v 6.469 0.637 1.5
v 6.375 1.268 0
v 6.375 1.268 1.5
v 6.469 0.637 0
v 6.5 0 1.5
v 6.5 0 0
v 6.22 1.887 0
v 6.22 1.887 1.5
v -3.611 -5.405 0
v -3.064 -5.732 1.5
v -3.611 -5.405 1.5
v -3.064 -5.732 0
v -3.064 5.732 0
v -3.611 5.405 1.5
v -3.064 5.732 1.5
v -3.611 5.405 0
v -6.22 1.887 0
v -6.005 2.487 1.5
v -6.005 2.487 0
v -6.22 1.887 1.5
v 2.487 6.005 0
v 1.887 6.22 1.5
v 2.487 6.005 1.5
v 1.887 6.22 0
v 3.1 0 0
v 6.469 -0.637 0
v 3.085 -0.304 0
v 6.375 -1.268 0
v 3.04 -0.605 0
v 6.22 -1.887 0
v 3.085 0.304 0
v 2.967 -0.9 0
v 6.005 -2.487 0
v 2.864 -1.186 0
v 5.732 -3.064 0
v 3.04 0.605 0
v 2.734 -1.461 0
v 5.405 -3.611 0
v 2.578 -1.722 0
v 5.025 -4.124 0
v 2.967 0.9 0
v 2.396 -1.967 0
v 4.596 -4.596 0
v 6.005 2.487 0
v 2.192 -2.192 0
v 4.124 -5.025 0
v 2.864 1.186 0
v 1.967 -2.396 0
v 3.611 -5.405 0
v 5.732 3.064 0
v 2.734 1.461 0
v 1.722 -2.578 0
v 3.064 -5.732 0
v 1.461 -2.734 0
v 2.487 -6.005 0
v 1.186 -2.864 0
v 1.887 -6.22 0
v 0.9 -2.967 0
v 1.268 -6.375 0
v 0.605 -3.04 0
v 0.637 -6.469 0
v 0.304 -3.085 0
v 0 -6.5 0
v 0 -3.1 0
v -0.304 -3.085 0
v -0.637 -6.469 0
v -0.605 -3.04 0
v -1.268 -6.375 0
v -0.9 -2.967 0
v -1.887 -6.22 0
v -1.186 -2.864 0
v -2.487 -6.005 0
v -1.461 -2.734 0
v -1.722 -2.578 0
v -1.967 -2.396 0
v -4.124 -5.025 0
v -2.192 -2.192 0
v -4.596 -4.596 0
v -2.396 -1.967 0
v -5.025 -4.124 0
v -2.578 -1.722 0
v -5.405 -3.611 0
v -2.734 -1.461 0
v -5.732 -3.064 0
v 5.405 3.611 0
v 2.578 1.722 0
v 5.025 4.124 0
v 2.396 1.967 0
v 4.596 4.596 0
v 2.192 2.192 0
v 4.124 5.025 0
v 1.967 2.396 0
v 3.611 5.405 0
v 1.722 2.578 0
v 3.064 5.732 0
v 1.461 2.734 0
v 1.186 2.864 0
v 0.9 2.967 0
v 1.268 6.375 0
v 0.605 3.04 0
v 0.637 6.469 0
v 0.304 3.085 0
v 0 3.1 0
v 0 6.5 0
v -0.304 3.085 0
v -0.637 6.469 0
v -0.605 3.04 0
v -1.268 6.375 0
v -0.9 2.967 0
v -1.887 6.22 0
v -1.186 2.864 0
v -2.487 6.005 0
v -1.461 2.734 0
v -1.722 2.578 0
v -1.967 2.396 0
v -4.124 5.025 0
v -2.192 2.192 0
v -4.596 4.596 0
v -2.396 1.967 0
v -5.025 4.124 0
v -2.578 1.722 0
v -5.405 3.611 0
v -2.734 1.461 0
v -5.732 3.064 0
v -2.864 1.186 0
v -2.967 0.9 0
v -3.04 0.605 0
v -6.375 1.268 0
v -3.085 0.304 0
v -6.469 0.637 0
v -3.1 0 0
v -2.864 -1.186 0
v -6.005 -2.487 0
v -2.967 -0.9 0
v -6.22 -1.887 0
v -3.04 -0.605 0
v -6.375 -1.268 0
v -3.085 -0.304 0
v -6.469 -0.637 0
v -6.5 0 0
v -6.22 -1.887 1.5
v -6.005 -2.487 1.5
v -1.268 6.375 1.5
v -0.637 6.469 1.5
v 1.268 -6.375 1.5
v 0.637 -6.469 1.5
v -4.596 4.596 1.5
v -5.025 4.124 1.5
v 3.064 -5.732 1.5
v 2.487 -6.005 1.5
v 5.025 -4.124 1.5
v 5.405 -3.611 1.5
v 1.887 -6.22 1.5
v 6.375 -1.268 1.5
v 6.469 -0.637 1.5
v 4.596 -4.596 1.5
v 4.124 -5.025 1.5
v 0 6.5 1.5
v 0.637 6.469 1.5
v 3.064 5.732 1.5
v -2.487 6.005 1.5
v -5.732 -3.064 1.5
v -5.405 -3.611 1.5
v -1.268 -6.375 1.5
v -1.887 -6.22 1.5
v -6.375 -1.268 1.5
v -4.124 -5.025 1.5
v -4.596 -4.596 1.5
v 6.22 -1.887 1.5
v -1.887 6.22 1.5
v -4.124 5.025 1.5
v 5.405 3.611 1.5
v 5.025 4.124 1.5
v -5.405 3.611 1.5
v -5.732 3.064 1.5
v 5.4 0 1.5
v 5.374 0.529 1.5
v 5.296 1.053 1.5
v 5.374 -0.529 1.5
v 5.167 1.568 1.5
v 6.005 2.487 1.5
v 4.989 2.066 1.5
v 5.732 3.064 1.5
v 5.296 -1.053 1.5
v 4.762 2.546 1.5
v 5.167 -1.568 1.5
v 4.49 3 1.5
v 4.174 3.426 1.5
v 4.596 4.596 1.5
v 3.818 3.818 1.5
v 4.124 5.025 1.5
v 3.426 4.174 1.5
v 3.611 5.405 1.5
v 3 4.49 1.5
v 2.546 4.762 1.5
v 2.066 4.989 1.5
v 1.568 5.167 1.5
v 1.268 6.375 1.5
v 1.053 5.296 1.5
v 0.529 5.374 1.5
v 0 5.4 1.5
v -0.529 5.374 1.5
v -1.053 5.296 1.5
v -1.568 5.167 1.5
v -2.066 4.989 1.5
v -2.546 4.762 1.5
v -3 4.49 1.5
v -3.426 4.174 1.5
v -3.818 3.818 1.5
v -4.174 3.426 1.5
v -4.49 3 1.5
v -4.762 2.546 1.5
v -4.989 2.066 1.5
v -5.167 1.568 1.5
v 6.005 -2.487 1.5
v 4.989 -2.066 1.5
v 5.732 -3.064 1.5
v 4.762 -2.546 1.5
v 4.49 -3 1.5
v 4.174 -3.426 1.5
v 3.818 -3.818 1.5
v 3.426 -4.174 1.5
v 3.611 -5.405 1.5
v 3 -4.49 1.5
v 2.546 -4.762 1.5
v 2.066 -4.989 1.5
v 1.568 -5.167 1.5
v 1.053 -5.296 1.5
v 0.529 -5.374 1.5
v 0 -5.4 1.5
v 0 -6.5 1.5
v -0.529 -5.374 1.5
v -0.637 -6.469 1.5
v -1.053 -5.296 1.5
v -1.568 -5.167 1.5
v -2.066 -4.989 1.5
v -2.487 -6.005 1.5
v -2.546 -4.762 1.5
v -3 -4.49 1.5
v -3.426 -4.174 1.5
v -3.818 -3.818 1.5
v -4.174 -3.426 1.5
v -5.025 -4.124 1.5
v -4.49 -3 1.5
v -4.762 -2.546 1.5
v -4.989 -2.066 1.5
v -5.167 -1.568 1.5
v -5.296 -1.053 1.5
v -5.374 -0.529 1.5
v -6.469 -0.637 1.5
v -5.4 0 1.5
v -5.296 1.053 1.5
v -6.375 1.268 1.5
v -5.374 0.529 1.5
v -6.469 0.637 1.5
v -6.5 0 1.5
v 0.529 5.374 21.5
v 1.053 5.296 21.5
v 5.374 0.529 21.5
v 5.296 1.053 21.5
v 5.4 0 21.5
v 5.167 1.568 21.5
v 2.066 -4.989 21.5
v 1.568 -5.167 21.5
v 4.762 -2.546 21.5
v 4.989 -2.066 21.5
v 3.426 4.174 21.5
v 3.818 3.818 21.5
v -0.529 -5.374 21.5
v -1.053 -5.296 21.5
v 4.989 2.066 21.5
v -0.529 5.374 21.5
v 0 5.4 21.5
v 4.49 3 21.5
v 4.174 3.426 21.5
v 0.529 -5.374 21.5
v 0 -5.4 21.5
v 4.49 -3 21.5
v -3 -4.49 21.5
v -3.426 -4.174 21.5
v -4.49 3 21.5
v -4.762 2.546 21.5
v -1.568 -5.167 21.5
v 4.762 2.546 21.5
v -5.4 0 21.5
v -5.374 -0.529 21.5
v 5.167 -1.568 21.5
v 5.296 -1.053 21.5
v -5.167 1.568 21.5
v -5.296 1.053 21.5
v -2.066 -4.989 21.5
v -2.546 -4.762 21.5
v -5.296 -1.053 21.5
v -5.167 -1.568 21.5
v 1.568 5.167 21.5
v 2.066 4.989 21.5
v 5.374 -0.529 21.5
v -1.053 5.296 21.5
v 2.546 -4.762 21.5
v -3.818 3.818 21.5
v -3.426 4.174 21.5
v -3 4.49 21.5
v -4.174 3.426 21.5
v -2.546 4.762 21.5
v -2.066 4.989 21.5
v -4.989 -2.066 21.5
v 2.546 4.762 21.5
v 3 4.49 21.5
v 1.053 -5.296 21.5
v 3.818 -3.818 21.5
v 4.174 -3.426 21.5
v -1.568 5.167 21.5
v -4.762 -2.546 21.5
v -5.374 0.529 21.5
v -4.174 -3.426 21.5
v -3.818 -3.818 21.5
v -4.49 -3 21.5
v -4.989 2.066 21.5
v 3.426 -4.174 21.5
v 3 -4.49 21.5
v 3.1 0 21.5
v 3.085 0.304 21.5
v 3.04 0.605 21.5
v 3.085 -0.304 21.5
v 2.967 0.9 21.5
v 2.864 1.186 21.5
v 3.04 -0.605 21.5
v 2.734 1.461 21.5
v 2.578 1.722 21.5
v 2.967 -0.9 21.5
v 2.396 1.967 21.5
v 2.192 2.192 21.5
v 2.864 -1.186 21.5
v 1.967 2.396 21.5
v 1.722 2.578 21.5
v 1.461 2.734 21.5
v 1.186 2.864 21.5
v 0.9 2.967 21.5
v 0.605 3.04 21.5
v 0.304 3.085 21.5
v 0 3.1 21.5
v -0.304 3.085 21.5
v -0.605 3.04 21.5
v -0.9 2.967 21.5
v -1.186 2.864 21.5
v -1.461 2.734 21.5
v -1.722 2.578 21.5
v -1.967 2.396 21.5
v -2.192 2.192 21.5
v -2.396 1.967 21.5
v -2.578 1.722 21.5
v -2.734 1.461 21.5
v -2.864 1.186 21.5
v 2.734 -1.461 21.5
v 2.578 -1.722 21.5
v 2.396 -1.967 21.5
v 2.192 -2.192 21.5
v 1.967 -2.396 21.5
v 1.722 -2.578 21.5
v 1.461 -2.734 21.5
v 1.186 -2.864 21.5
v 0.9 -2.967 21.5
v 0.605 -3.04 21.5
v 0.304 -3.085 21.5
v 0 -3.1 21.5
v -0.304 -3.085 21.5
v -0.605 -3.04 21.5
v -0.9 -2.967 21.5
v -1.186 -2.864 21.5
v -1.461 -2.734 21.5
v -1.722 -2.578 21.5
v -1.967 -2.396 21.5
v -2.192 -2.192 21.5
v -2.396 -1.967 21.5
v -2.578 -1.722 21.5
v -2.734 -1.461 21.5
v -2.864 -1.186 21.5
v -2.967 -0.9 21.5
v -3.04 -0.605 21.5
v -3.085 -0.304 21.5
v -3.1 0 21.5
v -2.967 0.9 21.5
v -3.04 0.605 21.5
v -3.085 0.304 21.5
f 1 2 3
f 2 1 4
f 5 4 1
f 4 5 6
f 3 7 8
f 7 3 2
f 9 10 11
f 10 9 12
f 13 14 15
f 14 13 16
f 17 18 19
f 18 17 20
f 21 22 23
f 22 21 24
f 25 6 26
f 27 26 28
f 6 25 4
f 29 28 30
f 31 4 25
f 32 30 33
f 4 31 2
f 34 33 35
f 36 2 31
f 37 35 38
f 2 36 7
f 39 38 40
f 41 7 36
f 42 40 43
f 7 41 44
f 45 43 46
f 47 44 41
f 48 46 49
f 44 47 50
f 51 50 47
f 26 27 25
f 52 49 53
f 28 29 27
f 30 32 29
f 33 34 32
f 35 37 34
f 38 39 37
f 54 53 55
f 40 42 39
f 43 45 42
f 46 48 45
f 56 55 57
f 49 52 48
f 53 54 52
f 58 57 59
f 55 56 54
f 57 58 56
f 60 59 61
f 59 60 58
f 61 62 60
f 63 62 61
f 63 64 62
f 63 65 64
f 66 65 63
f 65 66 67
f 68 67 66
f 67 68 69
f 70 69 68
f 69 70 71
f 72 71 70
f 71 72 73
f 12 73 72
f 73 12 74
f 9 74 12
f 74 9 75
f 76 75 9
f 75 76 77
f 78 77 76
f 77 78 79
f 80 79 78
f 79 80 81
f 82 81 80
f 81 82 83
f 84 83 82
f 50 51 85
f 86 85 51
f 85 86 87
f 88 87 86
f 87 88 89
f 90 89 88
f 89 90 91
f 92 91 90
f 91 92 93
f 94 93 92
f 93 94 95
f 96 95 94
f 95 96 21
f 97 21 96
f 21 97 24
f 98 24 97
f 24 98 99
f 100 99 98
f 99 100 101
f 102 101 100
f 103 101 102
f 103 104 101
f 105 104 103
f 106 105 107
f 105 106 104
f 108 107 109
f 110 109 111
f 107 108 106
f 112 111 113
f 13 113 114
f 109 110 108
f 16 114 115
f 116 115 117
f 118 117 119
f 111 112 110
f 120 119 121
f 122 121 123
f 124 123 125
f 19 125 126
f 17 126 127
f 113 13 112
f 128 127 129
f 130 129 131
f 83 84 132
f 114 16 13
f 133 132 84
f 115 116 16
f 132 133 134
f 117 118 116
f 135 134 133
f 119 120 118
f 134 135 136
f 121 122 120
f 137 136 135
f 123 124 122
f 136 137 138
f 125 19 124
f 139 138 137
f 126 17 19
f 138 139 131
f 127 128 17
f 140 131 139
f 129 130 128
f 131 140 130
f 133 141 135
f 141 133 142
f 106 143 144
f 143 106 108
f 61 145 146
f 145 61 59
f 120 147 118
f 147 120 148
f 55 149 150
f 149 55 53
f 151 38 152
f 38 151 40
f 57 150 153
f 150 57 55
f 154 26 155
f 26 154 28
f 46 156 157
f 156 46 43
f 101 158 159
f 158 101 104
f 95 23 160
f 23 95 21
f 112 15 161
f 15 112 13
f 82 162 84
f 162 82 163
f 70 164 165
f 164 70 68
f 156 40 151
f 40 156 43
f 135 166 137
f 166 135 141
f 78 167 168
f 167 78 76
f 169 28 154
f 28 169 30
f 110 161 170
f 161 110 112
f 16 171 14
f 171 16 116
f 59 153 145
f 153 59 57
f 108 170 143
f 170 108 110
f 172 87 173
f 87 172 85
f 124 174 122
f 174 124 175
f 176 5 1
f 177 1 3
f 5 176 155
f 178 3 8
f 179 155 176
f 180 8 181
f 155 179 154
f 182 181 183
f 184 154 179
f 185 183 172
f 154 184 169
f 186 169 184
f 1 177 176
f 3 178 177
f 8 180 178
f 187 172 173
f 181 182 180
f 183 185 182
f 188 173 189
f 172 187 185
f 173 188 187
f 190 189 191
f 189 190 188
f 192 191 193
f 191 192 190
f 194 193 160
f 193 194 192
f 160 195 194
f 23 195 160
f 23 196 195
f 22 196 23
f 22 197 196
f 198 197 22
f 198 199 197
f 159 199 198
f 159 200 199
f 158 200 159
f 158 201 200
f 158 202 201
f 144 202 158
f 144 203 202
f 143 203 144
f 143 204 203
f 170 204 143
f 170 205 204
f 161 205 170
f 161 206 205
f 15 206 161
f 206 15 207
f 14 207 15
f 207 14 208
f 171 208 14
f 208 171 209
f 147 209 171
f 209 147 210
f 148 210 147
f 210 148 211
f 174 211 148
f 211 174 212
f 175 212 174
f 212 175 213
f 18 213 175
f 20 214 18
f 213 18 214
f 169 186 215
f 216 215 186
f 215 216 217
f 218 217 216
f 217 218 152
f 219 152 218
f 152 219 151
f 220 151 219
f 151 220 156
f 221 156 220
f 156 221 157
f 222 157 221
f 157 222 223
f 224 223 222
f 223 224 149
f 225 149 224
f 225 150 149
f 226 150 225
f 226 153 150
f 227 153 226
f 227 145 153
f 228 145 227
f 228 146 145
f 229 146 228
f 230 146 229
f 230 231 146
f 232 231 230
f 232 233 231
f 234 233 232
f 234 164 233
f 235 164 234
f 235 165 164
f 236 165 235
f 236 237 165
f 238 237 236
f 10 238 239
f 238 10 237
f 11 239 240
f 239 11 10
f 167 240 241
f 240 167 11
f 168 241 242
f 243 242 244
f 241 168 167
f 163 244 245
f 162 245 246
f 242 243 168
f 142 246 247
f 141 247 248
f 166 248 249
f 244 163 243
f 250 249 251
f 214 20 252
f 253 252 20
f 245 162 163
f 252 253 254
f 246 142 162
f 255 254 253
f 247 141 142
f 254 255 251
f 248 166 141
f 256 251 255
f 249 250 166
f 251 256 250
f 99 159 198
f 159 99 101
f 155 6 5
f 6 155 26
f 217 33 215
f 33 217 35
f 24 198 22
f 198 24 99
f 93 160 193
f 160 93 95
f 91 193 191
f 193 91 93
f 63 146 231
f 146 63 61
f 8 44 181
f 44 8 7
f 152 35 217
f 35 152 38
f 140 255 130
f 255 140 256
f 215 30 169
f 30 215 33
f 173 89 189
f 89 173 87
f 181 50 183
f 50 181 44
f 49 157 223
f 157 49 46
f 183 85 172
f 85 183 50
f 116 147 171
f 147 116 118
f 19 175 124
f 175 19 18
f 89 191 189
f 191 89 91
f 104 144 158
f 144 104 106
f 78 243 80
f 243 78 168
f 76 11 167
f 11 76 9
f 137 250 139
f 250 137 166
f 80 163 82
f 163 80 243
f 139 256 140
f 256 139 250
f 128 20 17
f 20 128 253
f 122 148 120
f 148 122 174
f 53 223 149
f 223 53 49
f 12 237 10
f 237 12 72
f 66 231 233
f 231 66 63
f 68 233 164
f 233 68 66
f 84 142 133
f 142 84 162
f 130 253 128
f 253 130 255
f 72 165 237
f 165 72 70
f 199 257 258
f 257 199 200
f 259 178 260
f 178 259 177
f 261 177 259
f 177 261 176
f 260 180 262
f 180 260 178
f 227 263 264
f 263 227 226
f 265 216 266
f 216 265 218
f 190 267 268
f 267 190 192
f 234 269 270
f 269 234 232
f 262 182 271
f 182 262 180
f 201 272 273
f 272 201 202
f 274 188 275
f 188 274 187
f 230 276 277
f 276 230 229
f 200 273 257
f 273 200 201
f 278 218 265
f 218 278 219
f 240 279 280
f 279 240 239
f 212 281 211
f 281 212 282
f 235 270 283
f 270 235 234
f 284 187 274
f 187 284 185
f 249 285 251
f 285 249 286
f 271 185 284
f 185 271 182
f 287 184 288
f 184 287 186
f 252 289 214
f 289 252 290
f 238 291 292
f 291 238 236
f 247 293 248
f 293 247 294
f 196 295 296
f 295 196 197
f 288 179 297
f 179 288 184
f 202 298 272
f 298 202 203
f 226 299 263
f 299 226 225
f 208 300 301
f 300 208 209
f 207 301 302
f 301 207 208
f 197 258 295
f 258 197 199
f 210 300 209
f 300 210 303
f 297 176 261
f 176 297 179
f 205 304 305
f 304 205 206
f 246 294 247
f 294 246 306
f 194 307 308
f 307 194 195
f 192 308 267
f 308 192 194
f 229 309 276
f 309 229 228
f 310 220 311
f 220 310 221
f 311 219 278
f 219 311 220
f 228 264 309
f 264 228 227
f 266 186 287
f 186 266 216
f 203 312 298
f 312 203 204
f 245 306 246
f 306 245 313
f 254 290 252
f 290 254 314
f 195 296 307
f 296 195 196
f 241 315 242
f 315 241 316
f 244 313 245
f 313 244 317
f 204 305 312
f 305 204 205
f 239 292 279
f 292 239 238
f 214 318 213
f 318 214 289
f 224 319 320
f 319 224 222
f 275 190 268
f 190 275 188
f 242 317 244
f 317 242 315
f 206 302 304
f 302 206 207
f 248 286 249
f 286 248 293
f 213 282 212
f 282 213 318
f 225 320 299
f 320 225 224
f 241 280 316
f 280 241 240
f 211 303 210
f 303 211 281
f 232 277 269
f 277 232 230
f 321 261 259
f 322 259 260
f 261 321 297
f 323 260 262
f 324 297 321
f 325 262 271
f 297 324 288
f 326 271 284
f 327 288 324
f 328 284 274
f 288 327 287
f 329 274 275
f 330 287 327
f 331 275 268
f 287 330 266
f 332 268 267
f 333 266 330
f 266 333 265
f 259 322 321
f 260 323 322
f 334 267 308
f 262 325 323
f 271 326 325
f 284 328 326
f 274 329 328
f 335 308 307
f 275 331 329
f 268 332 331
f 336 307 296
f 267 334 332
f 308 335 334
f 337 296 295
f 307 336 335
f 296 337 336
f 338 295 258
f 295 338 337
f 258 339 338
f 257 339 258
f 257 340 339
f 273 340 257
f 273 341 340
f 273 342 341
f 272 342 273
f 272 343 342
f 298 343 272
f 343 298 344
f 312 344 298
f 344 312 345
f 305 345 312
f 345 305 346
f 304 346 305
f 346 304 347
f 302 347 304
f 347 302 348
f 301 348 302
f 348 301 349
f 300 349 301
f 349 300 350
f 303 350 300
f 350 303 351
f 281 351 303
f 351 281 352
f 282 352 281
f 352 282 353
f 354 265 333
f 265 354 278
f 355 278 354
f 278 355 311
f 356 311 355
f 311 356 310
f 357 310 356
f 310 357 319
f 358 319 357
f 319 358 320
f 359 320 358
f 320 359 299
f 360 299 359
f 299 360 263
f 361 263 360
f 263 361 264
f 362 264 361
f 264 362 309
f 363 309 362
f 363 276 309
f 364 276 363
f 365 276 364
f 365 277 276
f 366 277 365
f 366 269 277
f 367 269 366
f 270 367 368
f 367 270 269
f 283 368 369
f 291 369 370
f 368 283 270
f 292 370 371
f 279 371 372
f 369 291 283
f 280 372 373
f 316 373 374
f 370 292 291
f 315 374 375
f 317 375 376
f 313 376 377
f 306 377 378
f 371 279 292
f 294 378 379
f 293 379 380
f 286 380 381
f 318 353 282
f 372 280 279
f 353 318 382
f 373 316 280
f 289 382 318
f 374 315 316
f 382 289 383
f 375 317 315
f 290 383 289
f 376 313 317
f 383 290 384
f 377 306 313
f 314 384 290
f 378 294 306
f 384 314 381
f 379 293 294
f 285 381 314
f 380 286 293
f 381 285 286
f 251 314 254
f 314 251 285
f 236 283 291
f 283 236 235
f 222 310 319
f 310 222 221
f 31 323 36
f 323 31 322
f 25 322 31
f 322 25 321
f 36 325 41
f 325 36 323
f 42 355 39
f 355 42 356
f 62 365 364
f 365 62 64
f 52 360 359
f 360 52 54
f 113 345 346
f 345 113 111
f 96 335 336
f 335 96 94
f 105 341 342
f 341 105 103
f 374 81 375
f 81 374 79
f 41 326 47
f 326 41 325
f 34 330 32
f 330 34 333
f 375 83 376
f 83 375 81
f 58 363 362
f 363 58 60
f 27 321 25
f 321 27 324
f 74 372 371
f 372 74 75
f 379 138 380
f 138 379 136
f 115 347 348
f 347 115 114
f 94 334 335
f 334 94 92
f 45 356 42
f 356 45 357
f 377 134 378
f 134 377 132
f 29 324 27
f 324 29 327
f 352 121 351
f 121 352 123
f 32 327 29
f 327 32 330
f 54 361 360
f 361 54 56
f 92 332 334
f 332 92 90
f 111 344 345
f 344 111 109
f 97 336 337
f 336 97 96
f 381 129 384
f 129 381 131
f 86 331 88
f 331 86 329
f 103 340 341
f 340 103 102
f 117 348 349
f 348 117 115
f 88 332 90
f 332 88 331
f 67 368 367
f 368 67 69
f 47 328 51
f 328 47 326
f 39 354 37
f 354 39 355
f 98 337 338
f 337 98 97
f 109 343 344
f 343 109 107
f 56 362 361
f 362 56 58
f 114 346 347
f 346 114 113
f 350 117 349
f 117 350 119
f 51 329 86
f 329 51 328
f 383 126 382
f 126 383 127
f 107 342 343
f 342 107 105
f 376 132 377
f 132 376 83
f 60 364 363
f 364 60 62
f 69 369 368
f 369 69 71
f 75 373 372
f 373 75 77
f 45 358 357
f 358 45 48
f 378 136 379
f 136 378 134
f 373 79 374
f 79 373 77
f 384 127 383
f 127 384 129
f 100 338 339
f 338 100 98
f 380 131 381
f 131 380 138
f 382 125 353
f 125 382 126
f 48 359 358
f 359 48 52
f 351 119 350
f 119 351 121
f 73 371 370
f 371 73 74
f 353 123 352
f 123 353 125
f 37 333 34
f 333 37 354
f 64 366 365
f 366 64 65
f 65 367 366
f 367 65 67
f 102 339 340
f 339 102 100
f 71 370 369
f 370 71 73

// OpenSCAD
// Adapter sleeve: 0.2 mL PCR tube into a 1.5 mL rack hole
// Print orientation: collar on bed (z 0..1.5), sleeve body rising to z 21.5

// ---- Dimensions (mm) ----
collar_d   = 13.0;   // collar outer diameter
collar_h   = 1.5;    // collar thickness (z 0 to 1.5)
sleeve_od  = 10.8;   // sleeve body outer diameter
sleeve_h   = 21.5;   // total height of sleeve body (z 0 to 21.5)
bore_d     = 6.2;    // straight through-bore diameter

// ---- Derived radii ----
collar_r   = collar_d / 2;   // 6.5
sleeve_r   = sleeve_od / 2;   // 5.4
bore_r     = bore_d   / 2;    // 3.1

$fn = 64;

// ---- Build the solid, centred on origin in X/Y, resting on z = 0 ----
difference() {
    // Union of collar (z 0..1.5) and sleeve body (z 0..21.5)
    union() {
        // Collar: 13 mm dia, 1.5 mm thick, on the bed
        translate([0, 0, 0])
            cylinder(h = collar_h, d = collar_d, $fn = $fn);

        // Sleeve body: 10.8 mm dia, rising from collar to z = 21.5
        translate([0, 0, 0])
            cylinder(h = sleeve_h, d = sleeve_od, $fn = $fn);
    }

    // Straight 6.2 mm bore through the full height, open at both ends.
    // Cut extends 1 mm past each face so no faces are exactly coplanar.
    translate([0, 0, -1])
        cylinder(h = sleeve_h + 2, d = bore_d, $fn = $fn);
}
